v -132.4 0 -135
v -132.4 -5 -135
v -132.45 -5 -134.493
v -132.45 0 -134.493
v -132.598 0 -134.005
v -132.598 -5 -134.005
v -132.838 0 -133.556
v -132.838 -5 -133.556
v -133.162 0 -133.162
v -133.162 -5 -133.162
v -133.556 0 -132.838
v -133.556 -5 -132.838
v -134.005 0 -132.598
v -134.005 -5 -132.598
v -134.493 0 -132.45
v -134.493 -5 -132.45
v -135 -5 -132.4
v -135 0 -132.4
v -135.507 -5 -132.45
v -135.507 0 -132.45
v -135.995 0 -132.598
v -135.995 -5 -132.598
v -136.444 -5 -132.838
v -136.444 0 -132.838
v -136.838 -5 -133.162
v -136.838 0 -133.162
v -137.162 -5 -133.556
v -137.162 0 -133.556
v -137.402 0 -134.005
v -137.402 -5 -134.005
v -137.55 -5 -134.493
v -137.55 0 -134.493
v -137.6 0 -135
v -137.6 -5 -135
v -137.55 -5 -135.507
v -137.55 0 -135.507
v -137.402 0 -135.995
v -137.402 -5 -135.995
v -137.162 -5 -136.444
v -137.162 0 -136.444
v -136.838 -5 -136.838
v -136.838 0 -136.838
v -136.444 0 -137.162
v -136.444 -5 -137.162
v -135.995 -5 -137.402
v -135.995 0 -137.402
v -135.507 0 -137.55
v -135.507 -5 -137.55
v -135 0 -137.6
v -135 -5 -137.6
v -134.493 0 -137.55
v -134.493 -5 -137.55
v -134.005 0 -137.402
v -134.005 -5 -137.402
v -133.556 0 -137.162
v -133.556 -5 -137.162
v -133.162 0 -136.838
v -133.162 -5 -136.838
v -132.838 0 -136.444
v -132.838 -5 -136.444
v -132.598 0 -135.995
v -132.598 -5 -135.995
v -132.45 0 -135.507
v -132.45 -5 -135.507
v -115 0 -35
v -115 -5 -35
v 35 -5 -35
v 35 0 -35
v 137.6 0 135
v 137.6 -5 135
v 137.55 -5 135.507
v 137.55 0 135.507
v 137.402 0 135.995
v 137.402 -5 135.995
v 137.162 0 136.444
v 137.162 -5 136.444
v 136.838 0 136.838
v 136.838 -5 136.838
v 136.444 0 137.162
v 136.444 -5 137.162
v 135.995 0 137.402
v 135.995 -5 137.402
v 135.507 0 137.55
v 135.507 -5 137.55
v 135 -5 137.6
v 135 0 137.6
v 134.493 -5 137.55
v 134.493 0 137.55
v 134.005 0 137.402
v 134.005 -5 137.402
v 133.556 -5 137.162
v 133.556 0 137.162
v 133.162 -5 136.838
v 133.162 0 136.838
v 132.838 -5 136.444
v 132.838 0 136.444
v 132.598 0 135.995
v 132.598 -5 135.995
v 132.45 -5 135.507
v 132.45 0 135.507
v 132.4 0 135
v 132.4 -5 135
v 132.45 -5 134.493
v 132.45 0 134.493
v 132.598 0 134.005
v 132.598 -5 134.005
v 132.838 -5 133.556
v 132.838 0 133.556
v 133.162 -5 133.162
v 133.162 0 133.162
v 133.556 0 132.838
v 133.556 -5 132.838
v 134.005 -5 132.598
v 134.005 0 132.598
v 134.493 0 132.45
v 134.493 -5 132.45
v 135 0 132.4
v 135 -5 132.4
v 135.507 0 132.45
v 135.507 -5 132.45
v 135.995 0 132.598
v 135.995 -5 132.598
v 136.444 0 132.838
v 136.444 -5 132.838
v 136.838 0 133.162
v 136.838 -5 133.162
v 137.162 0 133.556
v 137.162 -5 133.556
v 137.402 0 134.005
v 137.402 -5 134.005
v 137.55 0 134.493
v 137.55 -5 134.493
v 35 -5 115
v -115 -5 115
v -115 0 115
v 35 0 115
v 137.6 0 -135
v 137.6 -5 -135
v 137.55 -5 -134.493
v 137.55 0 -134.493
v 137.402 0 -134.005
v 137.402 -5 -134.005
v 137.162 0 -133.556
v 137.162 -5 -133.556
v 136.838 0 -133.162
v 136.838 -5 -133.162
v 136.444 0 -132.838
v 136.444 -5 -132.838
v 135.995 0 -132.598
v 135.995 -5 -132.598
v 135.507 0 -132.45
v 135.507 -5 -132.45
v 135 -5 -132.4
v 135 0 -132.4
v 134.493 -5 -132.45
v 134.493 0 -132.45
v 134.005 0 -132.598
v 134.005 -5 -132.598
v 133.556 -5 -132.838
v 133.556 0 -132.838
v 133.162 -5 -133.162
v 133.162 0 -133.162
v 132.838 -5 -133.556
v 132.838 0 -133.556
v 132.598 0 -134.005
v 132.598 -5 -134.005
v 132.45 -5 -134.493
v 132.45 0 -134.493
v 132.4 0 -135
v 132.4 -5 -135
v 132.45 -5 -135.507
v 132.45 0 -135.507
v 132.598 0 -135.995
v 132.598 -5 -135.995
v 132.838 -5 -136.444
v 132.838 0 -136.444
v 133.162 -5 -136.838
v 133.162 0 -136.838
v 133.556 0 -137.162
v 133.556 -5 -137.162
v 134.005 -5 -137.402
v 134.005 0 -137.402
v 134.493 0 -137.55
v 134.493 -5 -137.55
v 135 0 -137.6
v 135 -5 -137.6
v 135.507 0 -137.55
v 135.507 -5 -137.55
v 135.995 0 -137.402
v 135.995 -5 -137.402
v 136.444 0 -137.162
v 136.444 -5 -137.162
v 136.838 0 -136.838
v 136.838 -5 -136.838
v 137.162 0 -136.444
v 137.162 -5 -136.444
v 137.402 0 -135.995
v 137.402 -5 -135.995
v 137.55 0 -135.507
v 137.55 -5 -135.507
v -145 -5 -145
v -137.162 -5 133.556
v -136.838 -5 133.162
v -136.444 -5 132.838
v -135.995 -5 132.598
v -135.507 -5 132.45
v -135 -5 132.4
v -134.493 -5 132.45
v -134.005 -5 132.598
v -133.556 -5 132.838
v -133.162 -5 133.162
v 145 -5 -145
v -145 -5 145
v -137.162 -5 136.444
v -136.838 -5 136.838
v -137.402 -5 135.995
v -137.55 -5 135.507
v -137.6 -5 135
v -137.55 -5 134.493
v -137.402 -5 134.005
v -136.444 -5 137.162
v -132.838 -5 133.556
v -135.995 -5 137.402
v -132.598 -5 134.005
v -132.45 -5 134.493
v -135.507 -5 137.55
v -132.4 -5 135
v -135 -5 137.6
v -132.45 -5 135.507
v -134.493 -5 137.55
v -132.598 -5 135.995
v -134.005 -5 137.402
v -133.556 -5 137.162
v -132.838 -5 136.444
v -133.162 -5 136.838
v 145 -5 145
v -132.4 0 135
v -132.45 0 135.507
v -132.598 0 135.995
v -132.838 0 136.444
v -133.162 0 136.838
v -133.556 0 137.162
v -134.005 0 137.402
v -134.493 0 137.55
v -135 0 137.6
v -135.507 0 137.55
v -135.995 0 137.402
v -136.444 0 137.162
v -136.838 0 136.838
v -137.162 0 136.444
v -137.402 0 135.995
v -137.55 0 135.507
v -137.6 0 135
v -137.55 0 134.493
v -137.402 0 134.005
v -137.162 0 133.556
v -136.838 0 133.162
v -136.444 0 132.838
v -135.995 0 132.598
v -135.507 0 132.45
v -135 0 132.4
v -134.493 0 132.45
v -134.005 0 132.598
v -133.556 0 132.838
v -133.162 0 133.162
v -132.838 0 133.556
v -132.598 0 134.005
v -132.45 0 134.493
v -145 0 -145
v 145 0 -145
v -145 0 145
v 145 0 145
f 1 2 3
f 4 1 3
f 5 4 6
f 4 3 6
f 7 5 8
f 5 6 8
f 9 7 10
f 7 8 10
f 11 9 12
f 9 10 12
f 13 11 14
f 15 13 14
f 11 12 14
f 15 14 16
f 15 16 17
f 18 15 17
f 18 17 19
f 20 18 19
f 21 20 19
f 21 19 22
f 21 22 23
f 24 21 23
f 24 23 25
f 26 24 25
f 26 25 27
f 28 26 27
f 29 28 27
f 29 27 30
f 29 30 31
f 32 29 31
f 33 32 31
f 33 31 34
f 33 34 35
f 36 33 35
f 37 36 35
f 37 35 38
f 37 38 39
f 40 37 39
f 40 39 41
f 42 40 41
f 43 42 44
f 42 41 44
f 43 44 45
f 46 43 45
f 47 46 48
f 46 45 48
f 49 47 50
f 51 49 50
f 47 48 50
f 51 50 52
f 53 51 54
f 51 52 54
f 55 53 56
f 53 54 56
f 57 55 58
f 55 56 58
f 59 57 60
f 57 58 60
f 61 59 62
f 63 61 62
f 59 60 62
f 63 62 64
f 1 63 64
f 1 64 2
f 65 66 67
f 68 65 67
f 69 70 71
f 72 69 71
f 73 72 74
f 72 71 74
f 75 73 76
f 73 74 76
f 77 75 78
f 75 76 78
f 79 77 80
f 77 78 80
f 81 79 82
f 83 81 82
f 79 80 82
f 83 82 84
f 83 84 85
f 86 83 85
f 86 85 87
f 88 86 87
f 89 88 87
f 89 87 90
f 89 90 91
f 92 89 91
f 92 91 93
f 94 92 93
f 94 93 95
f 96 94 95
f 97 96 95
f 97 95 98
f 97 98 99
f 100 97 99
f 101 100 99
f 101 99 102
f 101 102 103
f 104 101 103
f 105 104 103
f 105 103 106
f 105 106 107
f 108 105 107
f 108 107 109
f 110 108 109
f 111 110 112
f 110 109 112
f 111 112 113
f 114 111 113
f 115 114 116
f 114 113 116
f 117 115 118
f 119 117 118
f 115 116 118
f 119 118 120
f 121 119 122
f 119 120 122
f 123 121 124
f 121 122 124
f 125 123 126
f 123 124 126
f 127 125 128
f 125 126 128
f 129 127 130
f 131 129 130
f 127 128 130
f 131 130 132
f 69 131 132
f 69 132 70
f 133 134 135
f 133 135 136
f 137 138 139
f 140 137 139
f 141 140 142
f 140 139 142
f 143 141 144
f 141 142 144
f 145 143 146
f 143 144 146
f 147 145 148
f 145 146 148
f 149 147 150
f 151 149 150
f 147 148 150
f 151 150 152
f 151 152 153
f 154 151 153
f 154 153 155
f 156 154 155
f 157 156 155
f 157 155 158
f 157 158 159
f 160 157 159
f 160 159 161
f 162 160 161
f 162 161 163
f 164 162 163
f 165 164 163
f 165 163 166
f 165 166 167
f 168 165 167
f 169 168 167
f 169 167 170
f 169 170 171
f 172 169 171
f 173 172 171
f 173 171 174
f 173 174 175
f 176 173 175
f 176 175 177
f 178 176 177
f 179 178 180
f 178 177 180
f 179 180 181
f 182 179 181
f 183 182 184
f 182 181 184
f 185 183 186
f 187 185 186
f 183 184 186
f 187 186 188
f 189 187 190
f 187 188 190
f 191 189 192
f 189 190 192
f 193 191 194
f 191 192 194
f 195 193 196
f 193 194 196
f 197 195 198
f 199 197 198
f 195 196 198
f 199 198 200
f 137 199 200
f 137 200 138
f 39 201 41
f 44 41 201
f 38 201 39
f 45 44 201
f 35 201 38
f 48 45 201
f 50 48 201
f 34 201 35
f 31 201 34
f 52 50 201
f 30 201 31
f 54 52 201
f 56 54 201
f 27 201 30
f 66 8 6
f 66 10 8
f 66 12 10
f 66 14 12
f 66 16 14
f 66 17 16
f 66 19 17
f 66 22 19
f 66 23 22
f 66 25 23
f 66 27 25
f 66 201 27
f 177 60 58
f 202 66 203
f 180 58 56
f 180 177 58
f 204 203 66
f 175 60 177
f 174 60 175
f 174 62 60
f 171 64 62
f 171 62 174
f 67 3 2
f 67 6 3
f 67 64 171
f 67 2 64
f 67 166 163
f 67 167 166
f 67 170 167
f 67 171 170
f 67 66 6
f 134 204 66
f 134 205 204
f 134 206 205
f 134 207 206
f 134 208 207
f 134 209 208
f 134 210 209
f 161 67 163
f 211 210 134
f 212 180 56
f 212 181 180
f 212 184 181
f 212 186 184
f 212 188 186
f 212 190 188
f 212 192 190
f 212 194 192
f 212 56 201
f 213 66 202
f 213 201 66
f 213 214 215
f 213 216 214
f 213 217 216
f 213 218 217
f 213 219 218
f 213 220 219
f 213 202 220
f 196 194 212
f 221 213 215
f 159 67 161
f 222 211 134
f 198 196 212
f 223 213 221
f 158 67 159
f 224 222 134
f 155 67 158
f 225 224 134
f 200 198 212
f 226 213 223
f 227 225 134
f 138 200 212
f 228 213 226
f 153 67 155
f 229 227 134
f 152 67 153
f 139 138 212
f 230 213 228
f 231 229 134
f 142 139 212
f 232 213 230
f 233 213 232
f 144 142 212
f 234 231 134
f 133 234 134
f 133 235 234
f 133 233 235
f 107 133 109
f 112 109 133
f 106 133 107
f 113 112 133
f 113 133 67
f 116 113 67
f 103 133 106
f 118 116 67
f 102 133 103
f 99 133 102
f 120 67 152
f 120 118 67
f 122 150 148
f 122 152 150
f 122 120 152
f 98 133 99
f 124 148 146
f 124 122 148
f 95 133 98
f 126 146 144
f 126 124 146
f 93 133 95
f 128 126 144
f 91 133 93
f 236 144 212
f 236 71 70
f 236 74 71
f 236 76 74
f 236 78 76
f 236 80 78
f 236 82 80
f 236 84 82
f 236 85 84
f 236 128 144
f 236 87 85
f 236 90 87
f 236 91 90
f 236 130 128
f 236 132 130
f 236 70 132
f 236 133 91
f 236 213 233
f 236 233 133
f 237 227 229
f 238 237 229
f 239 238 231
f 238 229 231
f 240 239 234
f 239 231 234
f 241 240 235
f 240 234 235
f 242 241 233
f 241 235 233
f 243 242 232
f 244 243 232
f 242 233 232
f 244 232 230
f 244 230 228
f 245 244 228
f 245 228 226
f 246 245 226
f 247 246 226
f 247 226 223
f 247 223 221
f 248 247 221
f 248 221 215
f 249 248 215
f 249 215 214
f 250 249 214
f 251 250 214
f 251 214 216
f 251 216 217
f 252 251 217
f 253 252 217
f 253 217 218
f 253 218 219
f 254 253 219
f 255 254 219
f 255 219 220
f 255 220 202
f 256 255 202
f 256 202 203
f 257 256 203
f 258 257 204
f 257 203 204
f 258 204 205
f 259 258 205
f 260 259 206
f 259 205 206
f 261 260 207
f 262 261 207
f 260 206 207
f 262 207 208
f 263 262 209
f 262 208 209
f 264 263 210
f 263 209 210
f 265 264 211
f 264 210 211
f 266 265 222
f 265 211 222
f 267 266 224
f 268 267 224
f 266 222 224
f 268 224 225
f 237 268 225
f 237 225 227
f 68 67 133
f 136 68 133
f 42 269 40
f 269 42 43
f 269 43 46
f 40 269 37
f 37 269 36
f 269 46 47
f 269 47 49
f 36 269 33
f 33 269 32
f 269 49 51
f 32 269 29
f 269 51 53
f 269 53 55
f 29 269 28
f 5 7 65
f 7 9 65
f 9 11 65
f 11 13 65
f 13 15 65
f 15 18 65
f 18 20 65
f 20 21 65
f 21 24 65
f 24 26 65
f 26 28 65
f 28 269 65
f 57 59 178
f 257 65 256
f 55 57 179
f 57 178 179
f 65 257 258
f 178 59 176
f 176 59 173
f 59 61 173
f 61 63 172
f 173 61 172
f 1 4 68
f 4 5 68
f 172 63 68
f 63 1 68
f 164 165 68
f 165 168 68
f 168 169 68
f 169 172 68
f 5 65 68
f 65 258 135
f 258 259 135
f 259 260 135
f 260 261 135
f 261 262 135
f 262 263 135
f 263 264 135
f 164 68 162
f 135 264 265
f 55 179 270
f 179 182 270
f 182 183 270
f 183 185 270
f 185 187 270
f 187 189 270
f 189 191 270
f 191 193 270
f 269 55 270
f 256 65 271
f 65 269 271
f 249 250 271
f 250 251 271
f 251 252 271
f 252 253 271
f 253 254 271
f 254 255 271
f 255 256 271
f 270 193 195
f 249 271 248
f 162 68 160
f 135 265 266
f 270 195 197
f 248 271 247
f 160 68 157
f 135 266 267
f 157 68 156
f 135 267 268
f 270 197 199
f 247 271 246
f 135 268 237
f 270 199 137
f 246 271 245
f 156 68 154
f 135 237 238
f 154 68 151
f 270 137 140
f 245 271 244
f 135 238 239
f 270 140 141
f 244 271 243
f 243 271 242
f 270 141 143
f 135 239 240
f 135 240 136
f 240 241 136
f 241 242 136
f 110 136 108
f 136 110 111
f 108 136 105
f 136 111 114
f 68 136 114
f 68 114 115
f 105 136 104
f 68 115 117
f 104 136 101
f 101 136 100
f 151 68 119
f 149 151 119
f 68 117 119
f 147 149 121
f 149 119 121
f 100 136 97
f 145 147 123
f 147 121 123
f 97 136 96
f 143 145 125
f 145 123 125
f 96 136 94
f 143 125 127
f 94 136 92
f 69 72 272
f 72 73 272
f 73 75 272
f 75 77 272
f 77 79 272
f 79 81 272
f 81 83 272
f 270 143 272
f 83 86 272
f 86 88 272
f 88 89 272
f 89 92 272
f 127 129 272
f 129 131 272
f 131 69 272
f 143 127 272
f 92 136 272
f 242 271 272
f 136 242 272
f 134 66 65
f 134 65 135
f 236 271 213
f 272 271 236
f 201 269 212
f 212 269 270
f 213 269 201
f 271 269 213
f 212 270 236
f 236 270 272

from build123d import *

# Parameters (mm, degrees)
F0_W     = 290
F0_H     = 290
F1_DEPTH = 5
F2_R     = 2.6
F3_DEPTH = 5.001
F4_W     = 150
F4_H     = 150
F5_DEPTH = 5.001


with BuildPart() as f1:
    # F0 (on Front) → F1 (new body)
    with BuildSketch(Plane.XZ):
        Rectangle(F0_W, F0_H)
    extrude(amount=F1_DEPTH)

    # F2 (on face) → F3 (cut, through all)
    with BuildSketch(Plane.XZ.offset(5)):
        with Locations((-135, 135)):
            Circle(F2_R)
        with Locations((-135, -135)):
            Circle(F2_R)
        with Locations((135, 135)):
            Circle(F2_R)
        with Locations((135, -135)):
            Circle(F2_R)
        with Locations((405, 135)):
            Circle(F2_R)
        with Locations((405, -135)):
            Circle(F2_R)
    extrude(amount=-F3_DEPTH, mode=Mode.SUBTRACT)

    # F4 (on face) → F5 (cut, through all)
    with BuildSketch(Plane.XZ.offset(5)):
        with Locations((-40, 40)):
            Rectangle(F4_W, F4_H)
    extrude(amount=-F5_DEPTH, mode=Mode.SUBTRACT)


solid = f1.part
